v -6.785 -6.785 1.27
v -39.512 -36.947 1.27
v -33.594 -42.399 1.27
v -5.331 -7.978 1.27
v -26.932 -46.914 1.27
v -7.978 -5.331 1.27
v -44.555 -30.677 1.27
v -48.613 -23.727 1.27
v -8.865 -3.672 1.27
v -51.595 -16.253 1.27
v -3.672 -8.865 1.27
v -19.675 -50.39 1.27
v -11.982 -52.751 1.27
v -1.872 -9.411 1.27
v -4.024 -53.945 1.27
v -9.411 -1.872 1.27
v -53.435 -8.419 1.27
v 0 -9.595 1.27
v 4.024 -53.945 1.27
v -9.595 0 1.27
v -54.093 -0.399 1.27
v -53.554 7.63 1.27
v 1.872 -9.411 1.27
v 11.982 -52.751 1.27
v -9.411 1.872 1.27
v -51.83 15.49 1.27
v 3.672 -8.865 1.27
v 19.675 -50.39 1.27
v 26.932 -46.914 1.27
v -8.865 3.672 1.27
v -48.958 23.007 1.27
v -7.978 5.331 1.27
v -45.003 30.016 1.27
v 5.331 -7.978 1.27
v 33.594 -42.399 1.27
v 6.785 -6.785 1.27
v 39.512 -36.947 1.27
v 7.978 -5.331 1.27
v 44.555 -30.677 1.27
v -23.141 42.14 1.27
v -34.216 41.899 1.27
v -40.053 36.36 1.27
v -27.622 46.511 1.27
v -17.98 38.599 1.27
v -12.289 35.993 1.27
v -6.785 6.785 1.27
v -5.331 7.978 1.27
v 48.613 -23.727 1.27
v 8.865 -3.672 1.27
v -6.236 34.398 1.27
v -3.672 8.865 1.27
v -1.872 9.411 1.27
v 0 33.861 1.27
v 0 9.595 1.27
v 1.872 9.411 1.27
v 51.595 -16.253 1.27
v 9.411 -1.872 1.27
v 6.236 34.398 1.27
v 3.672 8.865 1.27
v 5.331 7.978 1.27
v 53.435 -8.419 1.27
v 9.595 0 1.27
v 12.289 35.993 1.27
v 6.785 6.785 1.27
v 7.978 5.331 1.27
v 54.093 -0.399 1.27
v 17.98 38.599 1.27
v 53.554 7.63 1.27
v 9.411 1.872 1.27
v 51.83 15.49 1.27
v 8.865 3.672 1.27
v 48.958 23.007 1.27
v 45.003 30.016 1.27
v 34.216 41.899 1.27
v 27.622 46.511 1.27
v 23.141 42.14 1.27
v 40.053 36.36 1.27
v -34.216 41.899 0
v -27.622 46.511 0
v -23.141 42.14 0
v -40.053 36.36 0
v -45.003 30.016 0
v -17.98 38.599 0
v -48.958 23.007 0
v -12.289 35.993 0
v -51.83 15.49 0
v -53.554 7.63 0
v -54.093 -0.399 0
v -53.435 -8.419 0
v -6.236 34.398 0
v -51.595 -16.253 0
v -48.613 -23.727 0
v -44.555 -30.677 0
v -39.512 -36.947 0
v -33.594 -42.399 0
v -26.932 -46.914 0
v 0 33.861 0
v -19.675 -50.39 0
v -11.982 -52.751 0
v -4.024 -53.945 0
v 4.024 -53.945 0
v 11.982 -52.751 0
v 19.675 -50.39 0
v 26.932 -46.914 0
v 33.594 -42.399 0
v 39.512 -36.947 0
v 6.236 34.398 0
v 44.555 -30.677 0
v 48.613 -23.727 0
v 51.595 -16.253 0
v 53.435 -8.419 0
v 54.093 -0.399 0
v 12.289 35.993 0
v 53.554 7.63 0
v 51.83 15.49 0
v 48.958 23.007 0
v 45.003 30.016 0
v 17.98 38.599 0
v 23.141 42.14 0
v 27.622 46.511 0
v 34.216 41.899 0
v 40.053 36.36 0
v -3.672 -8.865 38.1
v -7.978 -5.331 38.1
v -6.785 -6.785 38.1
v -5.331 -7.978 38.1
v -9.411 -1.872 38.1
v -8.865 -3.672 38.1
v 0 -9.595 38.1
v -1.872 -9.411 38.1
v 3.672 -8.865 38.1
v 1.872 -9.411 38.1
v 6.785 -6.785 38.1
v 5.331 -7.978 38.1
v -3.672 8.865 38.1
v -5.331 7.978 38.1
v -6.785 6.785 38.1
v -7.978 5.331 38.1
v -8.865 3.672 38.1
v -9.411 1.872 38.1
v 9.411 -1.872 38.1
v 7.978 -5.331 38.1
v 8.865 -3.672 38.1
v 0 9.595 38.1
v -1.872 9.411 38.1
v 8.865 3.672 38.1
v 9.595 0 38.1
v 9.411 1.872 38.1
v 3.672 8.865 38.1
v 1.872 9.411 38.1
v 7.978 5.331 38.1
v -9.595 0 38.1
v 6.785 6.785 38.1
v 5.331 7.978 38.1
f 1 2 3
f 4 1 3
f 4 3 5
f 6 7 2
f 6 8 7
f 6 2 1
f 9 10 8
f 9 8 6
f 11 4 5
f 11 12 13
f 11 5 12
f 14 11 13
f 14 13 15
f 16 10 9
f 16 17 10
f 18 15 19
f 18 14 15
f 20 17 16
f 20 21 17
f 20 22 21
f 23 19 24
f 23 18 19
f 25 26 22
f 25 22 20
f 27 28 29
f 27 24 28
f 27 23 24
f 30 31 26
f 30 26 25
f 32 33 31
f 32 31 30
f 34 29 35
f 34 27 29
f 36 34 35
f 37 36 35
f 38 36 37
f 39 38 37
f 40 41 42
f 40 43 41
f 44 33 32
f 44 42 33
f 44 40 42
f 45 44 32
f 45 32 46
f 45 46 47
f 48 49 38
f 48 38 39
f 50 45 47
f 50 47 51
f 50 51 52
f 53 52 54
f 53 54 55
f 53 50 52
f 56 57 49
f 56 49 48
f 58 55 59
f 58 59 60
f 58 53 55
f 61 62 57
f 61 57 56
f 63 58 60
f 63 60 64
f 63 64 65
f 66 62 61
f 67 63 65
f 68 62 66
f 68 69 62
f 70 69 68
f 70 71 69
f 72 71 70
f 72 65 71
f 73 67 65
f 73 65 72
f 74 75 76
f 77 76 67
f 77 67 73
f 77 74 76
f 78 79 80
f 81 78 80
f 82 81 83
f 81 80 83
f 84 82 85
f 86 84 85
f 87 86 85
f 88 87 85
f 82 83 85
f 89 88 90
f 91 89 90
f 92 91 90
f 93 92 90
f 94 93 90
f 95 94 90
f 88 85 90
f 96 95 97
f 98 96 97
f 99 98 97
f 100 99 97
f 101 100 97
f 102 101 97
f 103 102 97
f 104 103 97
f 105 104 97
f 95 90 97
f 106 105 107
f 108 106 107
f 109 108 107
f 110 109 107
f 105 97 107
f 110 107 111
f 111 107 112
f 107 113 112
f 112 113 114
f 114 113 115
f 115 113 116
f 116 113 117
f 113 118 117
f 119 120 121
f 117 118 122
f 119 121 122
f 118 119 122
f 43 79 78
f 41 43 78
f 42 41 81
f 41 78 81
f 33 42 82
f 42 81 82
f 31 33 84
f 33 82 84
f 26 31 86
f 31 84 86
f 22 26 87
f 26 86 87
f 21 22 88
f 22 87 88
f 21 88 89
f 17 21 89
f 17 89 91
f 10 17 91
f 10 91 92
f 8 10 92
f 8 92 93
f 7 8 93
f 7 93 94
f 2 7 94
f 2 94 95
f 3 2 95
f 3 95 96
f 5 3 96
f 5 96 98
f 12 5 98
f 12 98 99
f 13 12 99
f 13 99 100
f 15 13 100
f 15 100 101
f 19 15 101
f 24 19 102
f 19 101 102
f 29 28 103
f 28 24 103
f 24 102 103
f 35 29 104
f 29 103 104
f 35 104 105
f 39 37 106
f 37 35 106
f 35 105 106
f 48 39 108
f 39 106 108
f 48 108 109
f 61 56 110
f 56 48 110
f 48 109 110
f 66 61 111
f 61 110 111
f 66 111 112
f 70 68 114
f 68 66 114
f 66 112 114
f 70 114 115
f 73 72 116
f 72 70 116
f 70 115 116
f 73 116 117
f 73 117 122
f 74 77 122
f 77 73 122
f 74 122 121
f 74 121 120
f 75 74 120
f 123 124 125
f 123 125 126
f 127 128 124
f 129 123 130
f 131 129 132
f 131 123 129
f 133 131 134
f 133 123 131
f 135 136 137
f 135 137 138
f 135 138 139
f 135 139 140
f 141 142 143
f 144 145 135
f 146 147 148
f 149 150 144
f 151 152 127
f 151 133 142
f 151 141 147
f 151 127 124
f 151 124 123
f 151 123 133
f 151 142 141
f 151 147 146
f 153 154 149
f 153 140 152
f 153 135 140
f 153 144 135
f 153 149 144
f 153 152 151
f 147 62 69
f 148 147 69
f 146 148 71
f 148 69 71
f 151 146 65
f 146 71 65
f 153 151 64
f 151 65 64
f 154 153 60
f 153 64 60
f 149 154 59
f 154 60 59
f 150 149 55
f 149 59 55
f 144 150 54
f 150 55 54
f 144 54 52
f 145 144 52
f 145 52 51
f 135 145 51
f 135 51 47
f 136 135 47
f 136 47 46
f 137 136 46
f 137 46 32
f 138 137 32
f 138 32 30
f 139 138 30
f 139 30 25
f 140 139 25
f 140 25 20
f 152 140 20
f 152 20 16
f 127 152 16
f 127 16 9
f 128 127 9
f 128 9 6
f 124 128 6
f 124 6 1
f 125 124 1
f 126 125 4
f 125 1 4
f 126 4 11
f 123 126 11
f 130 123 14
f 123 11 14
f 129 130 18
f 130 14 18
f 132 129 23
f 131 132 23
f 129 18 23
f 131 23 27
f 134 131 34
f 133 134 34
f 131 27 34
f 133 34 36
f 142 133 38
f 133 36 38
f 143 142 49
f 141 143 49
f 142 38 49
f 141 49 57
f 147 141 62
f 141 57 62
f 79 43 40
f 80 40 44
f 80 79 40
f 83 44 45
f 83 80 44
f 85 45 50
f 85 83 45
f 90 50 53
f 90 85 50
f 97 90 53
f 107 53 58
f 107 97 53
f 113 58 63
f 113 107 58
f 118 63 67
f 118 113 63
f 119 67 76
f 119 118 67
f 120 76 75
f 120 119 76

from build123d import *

# Parameters (mm, degrees)
F0_R     = 54.0947036541
F1_DEPTH = 1.27
F2_R     = 36.4799484266
F3_DEPTH = 25.4
F4_R     = 9.5951765944
F5_DEPTH = 38.1


# Not quite as in the source:
# - the program builds the solid bodies; features that only make, move or delete a surface that nothing else refers to are left out


with BuildPart() as f1:
    # F0 (on Top) → F1 (new body)
    with BuildSketch(Plane.XY):
        Circle(F0_R)
    extrude(amount=F1_DEPTH)

    # F2 (on Top) → F3 (cut)
    with BuildSketch(Plane.XY):
        with Locations((0, 70.3405514359)):
            Circle(F2_R)
    extrude(amount=F3_DEPTH, mode=Mode.SUBTRACT)

    # F4 (on Top) → F5 (join)
    with BuildSketch(Plane.XY):
        Circle(F4_R)
    extrude(amount=F5_DEPTH)


solid = f1.part
